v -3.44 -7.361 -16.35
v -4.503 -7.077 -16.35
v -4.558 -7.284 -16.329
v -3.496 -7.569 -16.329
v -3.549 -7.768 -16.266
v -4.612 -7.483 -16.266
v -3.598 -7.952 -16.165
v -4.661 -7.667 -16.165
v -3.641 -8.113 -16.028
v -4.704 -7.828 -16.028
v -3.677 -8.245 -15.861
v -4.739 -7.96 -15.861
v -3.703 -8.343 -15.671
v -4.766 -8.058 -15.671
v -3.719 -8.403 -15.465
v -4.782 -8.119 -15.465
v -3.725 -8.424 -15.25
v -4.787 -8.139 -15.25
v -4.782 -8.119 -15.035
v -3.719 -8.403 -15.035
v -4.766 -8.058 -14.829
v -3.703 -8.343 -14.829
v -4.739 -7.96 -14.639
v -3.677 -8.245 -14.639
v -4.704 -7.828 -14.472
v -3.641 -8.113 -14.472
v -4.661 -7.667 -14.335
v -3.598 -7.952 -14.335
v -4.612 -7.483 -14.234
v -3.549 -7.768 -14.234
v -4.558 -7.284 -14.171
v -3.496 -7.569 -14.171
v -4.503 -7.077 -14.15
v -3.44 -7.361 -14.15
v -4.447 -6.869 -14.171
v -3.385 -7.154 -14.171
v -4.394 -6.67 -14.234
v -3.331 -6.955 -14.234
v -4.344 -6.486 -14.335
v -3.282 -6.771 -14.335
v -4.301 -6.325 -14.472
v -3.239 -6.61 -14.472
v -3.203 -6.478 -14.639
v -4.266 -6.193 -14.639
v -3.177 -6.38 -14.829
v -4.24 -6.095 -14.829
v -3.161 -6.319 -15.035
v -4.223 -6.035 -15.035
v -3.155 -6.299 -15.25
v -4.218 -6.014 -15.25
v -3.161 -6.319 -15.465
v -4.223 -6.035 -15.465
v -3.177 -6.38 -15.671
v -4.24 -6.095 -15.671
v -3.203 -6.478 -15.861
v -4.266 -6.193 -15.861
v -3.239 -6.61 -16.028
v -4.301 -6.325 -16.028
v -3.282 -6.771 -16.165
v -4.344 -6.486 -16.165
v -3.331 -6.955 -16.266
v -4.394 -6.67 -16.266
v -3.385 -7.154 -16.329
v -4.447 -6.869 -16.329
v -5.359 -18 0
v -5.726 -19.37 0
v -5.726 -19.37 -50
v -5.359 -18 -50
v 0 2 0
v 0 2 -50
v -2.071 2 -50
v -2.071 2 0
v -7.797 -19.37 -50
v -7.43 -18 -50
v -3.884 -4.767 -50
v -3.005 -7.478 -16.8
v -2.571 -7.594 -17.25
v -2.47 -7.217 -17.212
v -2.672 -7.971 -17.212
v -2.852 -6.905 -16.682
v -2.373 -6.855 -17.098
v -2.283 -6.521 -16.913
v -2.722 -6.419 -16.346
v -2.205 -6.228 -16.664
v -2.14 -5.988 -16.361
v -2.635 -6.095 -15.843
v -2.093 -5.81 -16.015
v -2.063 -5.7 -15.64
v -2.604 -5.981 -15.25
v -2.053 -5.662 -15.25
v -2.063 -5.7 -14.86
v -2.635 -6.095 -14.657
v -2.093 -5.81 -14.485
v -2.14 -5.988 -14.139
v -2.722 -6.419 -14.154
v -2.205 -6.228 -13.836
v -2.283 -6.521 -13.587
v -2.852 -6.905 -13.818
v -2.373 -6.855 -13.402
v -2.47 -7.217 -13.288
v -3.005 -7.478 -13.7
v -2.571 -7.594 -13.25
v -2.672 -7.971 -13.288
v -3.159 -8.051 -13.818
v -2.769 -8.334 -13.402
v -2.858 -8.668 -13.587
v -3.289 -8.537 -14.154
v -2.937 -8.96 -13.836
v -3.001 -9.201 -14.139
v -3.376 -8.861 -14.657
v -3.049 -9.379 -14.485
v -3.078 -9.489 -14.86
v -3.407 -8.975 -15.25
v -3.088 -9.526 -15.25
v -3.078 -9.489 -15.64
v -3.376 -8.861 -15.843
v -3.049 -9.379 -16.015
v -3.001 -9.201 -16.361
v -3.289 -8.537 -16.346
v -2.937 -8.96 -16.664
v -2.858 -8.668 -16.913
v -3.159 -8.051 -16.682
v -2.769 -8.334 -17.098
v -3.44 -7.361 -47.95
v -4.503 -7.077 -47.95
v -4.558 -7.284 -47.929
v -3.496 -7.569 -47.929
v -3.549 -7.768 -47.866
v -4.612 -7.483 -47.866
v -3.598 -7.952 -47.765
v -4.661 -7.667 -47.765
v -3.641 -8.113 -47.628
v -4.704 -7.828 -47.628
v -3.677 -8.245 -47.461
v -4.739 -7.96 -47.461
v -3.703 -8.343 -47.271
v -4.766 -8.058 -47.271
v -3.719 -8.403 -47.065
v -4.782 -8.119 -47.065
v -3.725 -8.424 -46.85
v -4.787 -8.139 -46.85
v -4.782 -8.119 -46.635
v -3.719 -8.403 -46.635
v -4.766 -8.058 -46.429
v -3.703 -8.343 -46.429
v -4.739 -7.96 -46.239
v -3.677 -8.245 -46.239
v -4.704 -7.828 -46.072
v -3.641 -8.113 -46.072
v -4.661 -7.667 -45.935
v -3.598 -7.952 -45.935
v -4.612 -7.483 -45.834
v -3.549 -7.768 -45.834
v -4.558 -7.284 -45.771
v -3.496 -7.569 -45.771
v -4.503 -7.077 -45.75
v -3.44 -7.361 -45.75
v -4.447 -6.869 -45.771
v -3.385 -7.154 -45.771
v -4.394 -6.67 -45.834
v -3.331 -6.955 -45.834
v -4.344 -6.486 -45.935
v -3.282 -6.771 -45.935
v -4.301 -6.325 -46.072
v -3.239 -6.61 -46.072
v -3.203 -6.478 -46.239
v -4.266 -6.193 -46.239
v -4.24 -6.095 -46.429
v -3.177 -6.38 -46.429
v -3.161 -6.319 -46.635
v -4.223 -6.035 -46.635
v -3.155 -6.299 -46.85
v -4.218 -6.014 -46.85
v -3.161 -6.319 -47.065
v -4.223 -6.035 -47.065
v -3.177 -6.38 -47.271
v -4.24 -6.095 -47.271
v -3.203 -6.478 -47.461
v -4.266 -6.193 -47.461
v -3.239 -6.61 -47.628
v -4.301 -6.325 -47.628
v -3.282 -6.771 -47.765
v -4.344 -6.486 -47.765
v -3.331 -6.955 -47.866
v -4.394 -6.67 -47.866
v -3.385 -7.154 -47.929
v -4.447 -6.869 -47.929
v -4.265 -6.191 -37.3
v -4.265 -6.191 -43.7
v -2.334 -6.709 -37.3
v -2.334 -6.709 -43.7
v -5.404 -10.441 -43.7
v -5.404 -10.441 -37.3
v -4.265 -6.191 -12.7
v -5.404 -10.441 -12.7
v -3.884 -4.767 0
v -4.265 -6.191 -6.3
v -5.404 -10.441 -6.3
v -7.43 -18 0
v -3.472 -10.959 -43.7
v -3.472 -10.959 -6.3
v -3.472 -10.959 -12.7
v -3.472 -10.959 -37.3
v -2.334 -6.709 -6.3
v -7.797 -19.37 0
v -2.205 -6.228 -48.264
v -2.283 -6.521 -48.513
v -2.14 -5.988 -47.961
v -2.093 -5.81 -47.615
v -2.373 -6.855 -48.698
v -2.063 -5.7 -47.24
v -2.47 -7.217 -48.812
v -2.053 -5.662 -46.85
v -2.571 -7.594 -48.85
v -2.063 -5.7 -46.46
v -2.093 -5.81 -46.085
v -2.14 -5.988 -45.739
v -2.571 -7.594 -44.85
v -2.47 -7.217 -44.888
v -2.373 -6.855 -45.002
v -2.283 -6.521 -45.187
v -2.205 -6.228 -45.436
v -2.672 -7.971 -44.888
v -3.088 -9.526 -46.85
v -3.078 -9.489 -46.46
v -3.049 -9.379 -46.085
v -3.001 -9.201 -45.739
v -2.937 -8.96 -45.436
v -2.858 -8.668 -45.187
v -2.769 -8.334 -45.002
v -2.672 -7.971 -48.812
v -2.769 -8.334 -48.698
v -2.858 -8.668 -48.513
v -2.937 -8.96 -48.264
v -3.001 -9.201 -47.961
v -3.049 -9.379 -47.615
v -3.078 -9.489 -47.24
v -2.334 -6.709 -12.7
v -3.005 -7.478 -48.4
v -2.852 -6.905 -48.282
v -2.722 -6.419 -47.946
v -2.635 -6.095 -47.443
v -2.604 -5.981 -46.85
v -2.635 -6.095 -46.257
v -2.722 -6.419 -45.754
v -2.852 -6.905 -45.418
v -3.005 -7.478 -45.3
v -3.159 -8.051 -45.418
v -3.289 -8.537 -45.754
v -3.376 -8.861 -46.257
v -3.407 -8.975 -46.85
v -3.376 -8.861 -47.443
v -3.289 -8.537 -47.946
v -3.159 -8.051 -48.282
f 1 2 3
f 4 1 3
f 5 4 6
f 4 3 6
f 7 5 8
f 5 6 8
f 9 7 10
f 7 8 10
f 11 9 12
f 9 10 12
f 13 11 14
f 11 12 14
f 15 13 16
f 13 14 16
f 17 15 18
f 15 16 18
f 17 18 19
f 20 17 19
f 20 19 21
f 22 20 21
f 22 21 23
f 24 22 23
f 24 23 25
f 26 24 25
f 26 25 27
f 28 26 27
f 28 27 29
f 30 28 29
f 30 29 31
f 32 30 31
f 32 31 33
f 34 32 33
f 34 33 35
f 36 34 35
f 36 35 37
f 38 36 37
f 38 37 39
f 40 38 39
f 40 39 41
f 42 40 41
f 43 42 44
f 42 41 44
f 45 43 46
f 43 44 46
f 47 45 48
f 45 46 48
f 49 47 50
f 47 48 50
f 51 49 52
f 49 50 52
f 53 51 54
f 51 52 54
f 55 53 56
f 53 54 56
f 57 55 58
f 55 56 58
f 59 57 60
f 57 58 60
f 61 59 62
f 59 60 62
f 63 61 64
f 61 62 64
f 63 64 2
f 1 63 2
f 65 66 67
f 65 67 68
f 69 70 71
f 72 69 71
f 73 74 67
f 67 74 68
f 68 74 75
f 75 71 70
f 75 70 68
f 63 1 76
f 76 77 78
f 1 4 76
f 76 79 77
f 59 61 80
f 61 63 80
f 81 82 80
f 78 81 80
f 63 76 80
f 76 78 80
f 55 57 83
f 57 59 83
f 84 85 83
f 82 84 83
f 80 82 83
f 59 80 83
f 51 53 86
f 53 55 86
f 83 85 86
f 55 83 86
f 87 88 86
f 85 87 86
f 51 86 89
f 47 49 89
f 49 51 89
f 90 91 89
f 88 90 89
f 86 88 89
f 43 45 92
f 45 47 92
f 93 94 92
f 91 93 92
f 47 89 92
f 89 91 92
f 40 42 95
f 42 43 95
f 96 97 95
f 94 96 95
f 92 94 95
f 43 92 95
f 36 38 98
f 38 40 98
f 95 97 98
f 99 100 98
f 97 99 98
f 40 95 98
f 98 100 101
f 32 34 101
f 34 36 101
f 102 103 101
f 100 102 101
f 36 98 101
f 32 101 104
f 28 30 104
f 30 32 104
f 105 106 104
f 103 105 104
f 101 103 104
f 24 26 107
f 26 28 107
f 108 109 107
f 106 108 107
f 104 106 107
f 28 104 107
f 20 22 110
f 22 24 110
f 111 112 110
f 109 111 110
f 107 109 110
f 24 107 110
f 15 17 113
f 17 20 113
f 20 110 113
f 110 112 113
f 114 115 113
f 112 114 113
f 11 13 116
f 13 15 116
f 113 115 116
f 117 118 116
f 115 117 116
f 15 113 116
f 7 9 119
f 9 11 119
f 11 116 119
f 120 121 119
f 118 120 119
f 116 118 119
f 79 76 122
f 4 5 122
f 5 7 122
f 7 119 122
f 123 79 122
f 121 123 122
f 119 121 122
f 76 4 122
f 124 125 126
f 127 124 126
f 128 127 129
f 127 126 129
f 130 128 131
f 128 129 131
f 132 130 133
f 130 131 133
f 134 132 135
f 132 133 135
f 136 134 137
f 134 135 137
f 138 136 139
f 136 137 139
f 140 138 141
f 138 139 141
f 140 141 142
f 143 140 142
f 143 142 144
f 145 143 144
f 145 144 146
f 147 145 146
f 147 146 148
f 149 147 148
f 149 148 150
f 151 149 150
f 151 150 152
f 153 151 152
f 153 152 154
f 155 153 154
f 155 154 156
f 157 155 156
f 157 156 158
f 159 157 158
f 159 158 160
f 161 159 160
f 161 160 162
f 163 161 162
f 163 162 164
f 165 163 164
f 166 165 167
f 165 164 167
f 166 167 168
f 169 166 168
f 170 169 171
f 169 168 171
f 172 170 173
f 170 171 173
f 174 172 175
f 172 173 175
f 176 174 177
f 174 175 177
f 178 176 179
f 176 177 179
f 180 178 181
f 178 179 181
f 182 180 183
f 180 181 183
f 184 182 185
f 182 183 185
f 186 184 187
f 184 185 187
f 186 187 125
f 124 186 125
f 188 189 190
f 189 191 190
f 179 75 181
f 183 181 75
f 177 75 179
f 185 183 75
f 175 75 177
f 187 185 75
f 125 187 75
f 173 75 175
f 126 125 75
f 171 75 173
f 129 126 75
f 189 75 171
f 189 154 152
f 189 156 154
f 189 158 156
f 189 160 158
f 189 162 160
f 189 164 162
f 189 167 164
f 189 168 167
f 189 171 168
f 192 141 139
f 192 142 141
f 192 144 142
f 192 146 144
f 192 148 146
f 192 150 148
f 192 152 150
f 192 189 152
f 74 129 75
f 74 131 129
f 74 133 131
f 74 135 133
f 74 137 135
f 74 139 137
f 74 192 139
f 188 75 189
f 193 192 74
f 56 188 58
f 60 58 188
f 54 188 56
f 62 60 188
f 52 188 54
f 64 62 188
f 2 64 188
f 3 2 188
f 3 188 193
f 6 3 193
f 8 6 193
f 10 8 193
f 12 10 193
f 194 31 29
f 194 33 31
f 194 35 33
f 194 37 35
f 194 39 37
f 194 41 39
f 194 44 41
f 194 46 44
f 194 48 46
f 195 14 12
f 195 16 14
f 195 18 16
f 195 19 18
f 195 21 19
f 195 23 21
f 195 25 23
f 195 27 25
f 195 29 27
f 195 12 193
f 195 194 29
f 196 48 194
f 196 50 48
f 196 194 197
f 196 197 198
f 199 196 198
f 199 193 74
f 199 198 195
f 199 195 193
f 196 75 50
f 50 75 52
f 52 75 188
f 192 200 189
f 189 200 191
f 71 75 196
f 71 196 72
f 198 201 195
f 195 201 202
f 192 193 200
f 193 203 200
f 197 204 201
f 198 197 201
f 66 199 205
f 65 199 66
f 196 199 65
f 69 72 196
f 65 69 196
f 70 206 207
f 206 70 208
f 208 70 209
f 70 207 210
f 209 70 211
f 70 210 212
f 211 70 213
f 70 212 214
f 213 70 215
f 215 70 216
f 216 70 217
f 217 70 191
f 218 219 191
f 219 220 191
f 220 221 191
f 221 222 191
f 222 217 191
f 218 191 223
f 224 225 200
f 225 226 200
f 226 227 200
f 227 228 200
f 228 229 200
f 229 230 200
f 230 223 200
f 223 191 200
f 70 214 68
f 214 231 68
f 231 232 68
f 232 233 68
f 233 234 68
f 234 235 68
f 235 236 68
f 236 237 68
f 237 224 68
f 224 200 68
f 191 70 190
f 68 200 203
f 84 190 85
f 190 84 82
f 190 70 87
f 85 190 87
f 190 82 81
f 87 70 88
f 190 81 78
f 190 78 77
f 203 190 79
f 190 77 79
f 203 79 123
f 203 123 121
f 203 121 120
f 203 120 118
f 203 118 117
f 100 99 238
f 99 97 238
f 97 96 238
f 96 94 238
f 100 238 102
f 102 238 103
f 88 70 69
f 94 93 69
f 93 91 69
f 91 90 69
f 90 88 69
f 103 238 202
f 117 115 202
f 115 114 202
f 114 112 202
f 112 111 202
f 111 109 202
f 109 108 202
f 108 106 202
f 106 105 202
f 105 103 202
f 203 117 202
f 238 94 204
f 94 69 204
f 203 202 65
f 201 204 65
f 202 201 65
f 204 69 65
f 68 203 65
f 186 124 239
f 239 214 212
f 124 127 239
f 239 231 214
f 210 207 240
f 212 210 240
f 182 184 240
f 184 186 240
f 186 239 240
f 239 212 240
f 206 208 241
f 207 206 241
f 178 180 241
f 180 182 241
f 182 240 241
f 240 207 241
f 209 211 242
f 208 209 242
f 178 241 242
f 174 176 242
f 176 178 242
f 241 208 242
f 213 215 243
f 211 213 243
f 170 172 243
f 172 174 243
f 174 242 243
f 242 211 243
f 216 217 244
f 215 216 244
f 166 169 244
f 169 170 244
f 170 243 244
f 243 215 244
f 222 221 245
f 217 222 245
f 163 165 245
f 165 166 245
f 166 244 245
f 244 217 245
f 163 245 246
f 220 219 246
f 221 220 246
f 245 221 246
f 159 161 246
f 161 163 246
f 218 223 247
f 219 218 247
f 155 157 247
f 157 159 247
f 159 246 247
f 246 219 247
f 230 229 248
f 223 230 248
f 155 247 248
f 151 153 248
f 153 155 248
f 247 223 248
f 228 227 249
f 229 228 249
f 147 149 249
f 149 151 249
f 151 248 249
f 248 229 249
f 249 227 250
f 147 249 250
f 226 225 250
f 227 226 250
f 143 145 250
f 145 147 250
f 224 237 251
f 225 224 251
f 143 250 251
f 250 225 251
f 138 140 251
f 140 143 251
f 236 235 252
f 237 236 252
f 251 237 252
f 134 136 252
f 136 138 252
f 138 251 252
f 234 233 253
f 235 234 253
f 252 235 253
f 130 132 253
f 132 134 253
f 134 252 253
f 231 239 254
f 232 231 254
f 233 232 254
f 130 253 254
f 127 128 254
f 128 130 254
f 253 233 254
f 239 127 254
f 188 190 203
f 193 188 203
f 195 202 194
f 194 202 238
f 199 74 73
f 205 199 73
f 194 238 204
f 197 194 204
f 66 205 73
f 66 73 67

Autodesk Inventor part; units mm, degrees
ref_plane "YZ Plane" through (0, 0, 0) normal (1, 0, 0) x (0, 1, 0)
ref_plane "XZ Plane" through (0, 0, 0) normal (0, 1, 0) x (-1, 0, 0)
ref_plane "XY Plane" through (0, 0, 0) normal (0, 0, 1) x (1, 0, 0)
sketch "Szkic1" plane through (0, 0, 0) normal (0, 0, 1) x (1, 0, 0)
  line L0 (-10.5, 0) -> (0, 0) projected
  line L1 (0, 2) -> (-10.5, 2)
  line L2 (0, 2) -> (-5.359, -18)
  line L3 (-3.8837, -4.7669) -> (-2.0706, 2)
  line L4 (-3.8837, -4.7669) -> (-7.4295, -18)
  line L5 (-7.4295, -18) -> (-5.359, -18)
  dimension "d0" = 2
  dimension "d1" = 75
  dimension "d3" = 2
  dimension "d4" = 20
extrude "Wyciągnięcie proste1" add sketch "Szkic1" against normal blind 50
sketch "Szkic2" plane through (-5.359, -18, 0) normal (0.9659, -0.2588, 0) x (0, 0, -1)
  line L0 (42.7, 8.2894) -> (42.7, 10.6894) projected
  line L1 (38.3, 8.2894) -> (42.7, 8.2894) projected
  line L2 (7.3, 8.2894) -> (11.7, 8.2894) projected
  line L3 (11.7, 8.2894) -> (11.7, 10.6894) projected
  line L4 (42.7, 8.2894) -> (38.3, 8.2894)
  line L5 (38.3, 8.2894) -> (38.3, 10.6894)
  line L6 (38.3, 10.6894) -> (42.7, 10.6894)
  line L7 (42.7, 10.6894) -> (42.7, 8.2894)
  line L8 (11.7, 8.2894) -> (7.3, 8.2894)
  line L9 (7.3, 8.2894) -> (7.3, 10.6894)
  line L10 (7.3, 10.6894) -> (11.7, 10.6894)
  line L11 (11.7, 10.6894) -> (11.7, 8.2894)
  line L12 (43.7, 11.6894) -> (37.3, 11.6894)
  line L13 (37.3, 11.6894) -> (37.3, 7.2894)
  line L14 (37.3, 7.2894) -> (43.7, 7.2894)
  line L15 (43.7, 7.2894) -> (43.7, 11.6894)
  line L16 (12.7, 11.6894) -> (6.3, 11.6894)
  line L17 (6.3, 11.6894) -> (6.3, 7.2894)
  line L18 (6.3, 7.2894) -> (12.7, 7.2894)
  line L19 (12.7, 7.2894) -> (12.7, 11.6894)
  point P0 (0, 18.7737)
  dimension "d7" = 1
  dimension "d8" = 1
extrude "Wyciągnięcie proste2" cut sketch "Szkic2" against normal through all contours L1 L5 L6 L0 | L9 L10 L3 L2 | L15 L14 L13 L12 | L19 L18 L17 L16
sketch "Szkic3" plane through (0, 0, 0) normal (0, 0, 1) x (1, 0, 0)
  line L0 (-2.0706, 2) -> (-7.4295, -18) projected
  line L1 (-7.4295, -18) -> (-5.359, -18) projected
  line L2 (-5.359, -18) -> (0, 2) projected
  line L3 (0, 2) -> (-2.0706, 2) projected
  line L4 (-30.5, -19.37) -> (-8.3143, -19.37) projected
  line L5 (-7.4295, -18) -> (-8.3143, -19.37)
  line L6 (-8.3143, -19.37) -> (-5.7261, -19.37)
  line L7 (-5.7261, -19.37) -> (-5.359, -18)
  point P0 (0, 0)
extrude "Wyciągnięcie proste3" add sketch "Szkic3" against normal up to surface (50 mm away) contours L1 L7 L6 L5
sketch "Szkic4" plane through (0, 0, -50) normal (0, 0, -1) x (-1, 0, 0)
  line L0 (6.5775, -14.82) -> (7.7966, -19.37) projected
  line L1 (30.5, -19.37) -> (8.3143, -19.37) projected
  line L2 (8.3143, -19.37) -> (5.7261, -19.37) projected
  line L3 (7.4295, -18) -> (8.3143, -19.37) projected
  point P0 (0, 0)
extrude "Wyciągnięcie proste4" cut sketch "Szkic4" against normal through all
sketch "Szkic5" plane through (0, 2, 0) normal (0.9659, -0.2588, 0) x (0, 0, -1)
  circle A0 centre (46.85, -9.9328) radius 1 projected
  circle A1 centre (30.45, -9.9328) radius 1 projected
  circle A2 centre (15.25, -9.9328) radius 1 projected
  point P0 (0, -1.9319)
hole "Otwór1" at (-2.5708, -7.5943, -46.85) at (-2.5708, -7.5943, -15.25) direction (-0.9659, 0.2588, 0) diameter 2.2 depth 2 countersink diameter 4 countersink angle 90
properties part number "noz2"
